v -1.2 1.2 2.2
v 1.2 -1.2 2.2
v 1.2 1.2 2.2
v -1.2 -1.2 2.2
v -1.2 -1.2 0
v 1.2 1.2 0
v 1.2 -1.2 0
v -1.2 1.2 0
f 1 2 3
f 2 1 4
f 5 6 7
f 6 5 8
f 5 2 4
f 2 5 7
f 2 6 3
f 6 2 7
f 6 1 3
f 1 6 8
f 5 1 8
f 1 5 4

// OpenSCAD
// file: ../common/util.scad
// utility functions

module rotational_clone(clones=2) {
  for(i=[0:clones-1] ) {
    rotate([0,0,i * (360/clones)]) children();
  }
}
// file: ../settings.scad
/*
 *   Edit these settings to control the generated keycaps
 */

/* height of the part the finger rests on, doesn't exclude higher protrusions,
       eg. the saddle keycap rises on either side of the thumb for leverage */
effective_height=16+5;
//effective_height=11;

// maximum width in any direction, strict limit to prevent collision with adjacent keycaps
total_width=16;

// how thick the keycap, excluding the stem, should be. mostly aesthetic preference?
minimum_thickness = 1;


keycap_style = "trackpoint-lp";

/* can be auto (computationally expensive), manual (a bit janky, needs to be implemented for each keycap), or none.
     has no effect on certain keycaps such as trackpoint variants */
chamfer_style = "auto";

/* this allows you to rotate the keycap if the finger approaches at an angle
   you probably only want to rotate the Z-axis (third value) */
keycap_rotation = [0,0,0];


stem_model = "trackpoint-lp-clamp";


// "cr10 or "prusa" have presets, any other string will use a default tolerance, usually 0
printer = "prusa";

// slop factors for imprecision in the printing process
/*
vertical_slop = 0.1;
inner_slop = 0.4;
outer_slop = 0.2;
*/

/* -----------------------------------------------------------------------
 *  Do Not Edit - this machinery is consistent regardless of above values
 * -----------------------------------------------------------------------
 */

function auto_chamfer() = chamfer_style == "auto";

function manual_chamfer() = chamfer_style == "manual";
// main file
/*
 *  A mount for a low profile Trackpoint rubber cap
 */

// ignores minimum_thickness, chamfer_style, etc so this isn't really needed atm
include <../settings.scad>;
use <../common/util.scad>

//$inner_slop_x = 0.0;
//$inner_slop_y = -0.0;
outer_slop = 0.1;
print_width = .4;
layer_height=.2;
first_layer=.2;

// it may vary somewhat, but the height of my rubber cap is 5mm
function height_offset() = 5;

side = 2.5;
raw_height=2.5;
function height(stem=true) = (stem?first_layer:0) + floor((raw_height-(stem?first_layer:0))/layer_height)*layer_height;

function adjusted_side_x(stem=true) = stem ? side + (is_undef($inner_slop_x) ? 0 : $inner_slop_x) : side - outer_slop;
function adjusted_side_y(stem=true) = stem ? side + (is_undef($inner_slop_y) ? 0 : $inner_slop_y) : side - outer_slop;
// this alias is for using when making a hole for a stem
module cap_tplp(stem=true) {
  //adjusted_side = adjusted_side();
  adjusted_height = height(stem) + (stem?0*layer_height:-layer_height);

  translate([0,0,adjusted_height/2]) cube([adjusted_side_x(stem=stem),adjusted_side_y(stem=stem),adjusted_height],true);
  if(stem) {
    let(inside=.2,outside=print_width,s=inside+outside) {
      translate([adjusted_side_x(stem=stem)/2-inside,adjusted_side_y(stem=stem)/2-inside,0]) cube([s,s,adjusted_height]);
      translate([-adjusted_side_x(stem=stem)/2-outside,-adjusted_side_y(stem=stem)/2-outside,0]) cube([s,s,adjusted_height]);
      translate([adjusted_side_x(stem=stem)/2-inside,-adjusted_side_y(stem=stem)/2-outside,0]) cube([s,s,adjusted_height]);
      translate([-adjusted_side_x(stem=stem)/2-outside,adjusted_side_y(stem=stem)/2-inside,0]) cube([s,s,adjusted_height]);
    }
  }
}

// this is for using as a cap
module cap() {
  cap_tplp(stem=false);
}

cap($fn=12);
